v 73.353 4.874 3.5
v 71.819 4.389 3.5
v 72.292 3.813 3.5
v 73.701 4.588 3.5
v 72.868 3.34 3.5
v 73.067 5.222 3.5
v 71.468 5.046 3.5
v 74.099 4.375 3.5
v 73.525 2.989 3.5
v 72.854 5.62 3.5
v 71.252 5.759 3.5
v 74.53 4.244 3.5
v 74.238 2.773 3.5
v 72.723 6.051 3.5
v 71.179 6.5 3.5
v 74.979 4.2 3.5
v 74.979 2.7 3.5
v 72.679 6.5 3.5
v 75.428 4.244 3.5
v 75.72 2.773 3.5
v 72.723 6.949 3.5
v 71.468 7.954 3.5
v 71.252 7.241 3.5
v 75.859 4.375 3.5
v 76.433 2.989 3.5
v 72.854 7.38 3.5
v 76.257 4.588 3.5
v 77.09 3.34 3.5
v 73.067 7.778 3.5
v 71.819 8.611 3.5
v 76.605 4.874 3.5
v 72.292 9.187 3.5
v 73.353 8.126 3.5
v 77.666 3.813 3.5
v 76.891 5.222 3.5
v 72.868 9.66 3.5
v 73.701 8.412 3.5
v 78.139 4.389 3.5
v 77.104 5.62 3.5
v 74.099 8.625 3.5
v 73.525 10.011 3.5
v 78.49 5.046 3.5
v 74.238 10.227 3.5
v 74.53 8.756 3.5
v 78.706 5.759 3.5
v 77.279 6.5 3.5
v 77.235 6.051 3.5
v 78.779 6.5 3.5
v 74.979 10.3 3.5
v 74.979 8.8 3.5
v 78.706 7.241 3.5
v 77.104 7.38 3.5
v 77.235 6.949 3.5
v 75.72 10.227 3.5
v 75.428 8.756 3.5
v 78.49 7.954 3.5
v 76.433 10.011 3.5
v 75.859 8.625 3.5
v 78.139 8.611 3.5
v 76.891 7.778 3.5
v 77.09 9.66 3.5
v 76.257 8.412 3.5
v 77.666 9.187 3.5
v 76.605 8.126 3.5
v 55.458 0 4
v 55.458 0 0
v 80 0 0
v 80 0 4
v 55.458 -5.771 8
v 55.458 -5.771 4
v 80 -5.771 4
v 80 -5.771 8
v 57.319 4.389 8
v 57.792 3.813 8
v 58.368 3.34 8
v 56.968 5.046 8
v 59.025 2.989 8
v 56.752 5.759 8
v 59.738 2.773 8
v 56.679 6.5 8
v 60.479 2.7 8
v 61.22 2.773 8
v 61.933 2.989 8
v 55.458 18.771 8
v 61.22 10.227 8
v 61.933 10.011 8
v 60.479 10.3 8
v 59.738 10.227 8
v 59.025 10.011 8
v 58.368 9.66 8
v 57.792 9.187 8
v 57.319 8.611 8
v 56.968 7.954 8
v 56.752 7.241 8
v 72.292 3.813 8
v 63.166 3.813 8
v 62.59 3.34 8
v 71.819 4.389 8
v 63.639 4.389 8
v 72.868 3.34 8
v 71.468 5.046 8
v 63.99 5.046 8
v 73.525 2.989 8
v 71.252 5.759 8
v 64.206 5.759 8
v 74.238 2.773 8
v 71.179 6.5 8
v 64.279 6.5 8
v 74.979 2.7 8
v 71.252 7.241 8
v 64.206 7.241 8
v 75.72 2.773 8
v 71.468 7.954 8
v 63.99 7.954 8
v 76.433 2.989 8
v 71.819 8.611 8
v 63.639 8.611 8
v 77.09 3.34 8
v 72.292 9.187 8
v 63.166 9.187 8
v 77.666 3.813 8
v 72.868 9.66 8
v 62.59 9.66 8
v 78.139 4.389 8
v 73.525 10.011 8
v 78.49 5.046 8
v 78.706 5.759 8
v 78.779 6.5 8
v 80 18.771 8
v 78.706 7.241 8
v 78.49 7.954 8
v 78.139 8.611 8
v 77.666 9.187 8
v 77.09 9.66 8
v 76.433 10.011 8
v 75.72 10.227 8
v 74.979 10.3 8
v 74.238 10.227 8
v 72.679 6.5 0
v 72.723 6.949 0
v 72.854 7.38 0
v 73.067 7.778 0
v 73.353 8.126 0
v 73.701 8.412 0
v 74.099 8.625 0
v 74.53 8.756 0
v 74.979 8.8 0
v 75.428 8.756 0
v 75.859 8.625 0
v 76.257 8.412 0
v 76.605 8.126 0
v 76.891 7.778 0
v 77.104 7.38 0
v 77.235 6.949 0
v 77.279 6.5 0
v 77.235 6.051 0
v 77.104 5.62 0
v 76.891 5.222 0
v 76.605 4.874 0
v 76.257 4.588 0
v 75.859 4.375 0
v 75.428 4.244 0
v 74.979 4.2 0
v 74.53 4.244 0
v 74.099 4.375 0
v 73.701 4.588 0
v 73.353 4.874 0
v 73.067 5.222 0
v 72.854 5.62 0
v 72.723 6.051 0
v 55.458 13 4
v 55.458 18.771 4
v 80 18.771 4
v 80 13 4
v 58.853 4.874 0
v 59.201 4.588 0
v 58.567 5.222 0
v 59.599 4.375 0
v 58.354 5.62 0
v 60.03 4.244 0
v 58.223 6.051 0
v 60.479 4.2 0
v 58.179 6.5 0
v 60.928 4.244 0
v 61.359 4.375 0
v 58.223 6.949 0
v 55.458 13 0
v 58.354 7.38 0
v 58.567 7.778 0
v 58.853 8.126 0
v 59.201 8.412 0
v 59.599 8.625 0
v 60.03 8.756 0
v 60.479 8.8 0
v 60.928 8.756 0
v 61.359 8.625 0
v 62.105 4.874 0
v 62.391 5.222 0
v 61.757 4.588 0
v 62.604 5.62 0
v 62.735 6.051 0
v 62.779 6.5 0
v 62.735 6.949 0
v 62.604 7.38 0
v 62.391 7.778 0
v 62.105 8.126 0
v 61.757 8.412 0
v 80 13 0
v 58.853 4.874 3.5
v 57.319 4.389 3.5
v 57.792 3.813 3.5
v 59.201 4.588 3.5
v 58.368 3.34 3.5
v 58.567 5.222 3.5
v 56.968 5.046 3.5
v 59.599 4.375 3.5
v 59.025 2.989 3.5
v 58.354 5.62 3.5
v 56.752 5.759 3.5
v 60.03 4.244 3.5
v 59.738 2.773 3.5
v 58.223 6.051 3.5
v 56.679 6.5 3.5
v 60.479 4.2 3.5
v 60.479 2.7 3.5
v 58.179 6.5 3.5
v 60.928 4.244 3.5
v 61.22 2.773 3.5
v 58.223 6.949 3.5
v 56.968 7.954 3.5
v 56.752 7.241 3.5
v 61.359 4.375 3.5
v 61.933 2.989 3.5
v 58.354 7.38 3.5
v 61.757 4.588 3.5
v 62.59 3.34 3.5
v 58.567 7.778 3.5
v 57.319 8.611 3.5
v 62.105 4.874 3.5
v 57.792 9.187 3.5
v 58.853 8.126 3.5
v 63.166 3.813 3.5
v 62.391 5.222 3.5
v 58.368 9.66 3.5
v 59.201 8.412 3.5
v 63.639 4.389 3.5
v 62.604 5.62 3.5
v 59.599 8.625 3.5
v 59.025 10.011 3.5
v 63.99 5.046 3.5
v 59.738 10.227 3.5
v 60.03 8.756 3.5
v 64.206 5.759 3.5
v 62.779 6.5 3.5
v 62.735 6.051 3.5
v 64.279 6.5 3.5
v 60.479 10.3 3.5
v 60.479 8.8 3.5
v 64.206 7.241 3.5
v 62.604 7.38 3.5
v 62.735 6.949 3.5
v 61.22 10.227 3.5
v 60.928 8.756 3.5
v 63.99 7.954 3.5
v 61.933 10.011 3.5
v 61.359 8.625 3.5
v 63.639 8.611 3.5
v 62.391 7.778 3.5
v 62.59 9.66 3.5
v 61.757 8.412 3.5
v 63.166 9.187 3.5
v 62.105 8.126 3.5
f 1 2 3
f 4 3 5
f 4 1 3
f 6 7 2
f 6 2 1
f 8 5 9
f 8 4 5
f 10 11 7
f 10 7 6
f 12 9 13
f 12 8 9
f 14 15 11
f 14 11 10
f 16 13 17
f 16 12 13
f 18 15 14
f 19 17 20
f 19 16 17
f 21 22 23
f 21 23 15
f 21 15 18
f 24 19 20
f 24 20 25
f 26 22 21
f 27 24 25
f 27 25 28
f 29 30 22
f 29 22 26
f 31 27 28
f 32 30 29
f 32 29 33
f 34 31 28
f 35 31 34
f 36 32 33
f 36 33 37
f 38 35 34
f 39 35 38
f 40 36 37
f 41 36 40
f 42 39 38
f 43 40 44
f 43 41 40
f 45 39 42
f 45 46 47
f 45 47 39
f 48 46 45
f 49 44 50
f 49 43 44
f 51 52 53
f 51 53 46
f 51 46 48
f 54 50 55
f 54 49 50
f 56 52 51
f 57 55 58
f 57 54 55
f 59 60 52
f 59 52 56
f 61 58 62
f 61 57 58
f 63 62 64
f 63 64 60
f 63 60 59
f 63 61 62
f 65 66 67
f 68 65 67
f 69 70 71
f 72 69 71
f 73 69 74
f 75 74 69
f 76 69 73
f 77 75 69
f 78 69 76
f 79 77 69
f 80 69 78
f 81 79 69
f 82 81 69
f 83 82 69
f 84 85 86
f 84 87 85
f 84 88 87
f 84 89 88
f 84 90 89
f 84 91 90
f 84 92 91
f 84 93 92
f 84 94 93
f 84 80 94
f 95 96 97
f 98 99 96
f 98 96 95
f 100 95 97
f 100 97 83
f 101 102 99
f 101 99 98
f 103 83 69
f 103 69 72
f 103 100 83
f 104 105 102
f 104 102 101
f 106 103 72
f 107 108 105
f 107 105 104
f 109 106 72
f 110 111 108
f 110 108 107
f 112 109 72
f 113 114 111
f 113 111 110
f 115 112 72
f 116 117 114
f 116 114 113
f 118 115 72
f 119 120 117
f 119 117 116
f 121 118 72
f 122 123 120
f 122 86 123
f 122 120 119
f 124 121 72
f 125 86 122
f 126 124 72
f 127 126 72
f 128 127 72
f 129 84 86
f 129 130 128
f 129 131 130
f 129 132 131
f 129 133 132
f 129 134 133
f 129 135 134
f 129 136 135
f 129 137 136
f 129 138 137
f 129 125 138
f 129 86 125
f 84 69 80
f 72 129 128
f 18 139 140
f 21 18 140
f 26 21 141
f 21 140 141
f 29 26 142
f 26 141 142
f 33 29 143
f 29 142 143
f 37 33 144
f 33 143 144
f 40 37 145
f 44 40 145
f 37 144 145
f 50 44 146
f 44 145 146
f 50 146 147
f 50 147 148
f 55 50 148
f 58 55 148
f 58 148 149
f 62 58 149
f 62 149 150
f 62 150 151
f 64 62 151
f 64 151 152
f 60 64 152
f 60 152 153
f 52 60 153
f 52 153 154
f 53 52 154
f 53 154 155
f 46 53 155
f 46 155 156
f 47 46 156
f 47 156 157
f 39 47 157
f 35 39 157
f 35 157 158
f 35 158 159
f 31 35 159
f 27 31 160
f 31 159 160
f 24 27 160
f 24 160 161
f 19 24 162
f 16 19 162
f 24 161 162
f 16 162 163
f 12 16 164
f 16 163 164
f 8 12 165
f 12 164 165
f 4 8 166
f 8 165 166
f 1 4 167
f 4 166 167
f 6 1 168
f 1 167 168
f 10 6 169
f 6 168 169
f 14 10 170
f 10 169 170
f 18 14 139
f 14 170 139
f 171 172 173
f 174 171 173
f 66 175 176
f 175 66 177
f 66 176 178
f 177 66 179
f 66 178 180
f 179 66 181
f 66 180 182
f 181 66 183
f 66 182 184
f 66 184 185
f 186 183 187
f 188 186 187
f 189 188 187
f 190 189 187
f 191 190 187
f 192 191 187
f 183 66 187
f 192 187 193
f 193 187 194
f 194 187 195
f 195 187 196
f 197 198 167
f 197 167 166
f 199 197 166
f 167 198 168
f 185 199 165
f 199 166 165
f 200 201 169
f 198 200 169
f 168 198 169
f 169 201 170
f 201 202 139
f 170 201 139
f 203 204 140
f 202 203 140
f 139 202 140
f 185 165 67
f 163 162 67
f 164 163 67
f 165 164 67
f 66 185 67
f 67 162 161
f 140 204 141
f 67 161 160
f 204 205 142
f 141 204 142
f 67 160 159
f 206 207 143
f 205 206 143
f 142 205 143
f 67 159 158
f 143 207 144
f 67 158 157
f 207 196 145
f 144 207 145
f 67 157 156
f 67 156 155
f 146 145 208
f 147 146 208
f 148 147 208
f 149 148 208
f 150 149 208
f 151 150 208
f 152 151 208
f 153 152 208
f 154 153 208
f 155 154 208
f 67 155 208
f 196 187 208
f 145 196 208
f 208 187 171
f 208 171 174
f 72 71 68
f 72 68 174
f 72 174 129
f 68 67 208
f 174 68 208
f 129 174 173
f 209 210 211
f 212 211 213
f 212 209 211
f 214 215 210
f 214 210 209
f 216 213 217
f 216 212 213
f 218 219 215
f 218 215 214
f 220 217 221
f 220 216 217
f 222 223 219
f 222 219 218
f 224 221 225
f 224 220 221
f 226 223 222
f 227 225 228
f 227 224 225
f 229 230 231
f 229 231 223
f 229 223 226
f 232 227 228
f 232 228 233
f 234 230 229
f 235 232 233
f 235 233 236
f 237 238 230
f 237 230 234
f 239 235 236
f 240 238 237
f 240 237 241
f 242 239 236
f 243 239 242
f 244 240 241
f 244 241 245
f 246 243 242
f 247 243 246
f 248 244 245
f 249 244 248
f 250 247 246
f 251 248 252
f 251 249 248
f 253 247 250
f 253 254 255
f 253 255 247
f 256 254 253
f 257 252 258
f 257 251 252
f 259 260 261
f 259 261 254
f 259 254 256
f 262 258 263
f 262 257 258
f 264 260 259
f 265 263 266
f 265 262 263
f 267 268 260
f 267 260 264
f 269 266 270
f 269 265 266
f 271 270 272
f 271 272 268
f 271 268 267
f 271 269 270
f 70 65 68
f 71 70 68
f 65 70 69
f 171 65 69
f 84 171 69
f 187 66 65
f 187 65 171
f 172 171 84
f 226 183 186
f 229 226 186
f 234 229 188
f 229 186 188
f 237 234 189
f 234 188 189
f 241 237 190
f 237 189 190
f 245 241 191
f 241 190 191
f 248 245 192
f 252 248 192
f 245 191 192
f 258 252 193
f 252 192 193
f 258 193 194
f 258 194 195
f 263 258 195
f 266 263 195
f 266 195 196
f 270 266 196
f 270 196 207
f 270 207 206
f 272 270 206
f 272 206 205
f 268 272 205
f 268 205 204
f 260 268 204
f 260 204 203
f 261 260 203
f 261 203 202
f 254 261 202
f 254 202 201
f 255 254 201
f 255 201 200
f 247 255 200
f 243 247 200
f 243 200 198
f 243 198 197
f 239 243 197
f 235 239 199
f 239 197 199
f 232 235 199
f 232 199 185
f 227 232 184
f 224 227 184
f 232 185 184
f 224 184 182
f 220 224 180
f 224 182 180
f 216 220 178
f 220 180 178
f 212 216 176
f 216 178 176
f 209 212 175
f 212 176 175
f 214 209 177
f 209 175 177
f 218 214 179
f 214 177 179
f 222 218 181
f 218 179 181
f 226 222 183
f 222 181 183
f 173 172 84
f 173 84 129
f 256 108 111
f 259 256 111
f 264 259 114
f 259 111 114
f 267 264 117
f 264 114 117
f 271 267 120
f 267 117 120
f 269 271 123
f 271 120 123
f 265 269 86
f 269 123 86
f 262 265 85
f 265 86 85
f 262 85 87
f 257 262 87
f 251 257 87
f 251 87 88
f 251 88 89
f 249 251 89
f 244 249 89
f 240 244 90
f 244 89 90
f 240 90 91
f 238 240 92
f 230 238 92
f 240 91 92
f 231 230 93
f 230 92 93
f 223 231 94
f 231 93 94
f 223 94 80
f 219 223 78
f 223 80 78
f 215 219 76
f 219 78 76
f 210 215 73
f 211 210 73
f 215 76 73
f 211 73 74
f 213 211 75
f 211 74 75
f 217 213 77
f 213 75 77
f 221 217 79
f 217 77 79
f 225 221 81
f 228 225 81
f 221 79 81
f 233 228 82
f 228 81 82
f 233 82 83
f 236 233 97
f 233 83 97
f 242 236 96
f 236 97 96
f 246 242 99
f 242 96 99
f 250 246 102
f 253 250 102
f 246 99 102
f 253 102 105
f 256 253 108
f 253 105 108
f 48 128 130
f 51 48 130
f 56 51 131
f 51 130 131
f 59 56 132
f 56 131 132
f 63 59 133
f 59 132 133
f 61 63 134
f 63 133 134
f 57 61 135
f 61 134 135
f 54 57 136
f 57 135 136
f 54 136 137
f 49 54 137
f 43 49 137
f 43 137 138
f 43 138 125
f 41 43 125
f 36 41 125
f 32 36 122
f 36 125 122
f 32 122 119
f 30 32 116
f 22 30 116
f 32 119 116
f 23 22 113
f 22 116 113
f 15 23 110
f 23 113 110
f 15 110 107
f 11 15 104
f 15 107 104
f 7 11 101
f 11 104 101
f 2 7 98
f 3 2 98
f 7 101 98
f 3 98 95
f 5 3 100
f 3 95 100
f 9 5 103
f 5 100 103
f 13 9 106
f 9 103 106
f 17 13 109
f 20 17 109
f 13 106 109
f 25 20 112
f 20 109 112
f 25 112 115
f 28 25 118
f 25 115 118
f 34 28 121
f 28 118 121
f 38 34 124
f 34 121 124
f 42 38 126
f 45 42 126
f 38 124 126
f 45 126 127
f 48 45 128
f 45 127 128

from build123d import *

# Parameters (mm, degrees)
SKETCH1_W           = 24.542
SKETCH1_H           = 13
BOSS_EXTRUDE1_DEPTH = 4
SKETCH2_W           = 24.542
SKETCH2_H           = 24.542
BOSS_EXTRUDE2_DEPTH = 4
SKETCH3_R           = 2.3
CUT_EXTRUDE1_DEPTH  = 9
SKETCH4_R           = 3.8
CUT_EXTRUDE2_DEPTH  = 4.5


with BuildPart() as part:
    # Sketch1 → Boss-Extrude1 (new body)
    with BuildSketch(Plane.XY):
        with Locations((67.729, 6.5)):
            Rectangle(SKETCH1_W, SKETCH1_H)
    extrude(amount=BOSS_EXTRUDE1_DEPTH)

    # Sketch2 → Boss-Extrude2 (add)
    with BuildSketch(Plane.XY.offset(4)):
        with Locations((67.729, 6.5)):
            Rectangle(SKETCH2_W, SKETCH2_H)
    extrude(amount=BOSS_EXTRUDE2_DEPTH)

    # Sketch3 → Cut-Extrude1 (cut, through all)
    with BuildSketch(Plane(origin=(0, 0, 0), x_dir=(-1, 0, 0), z_dir=(0, 0, -1))):
        with Locations((-60.479, 6.5)):
            Circle(SKETCH3_R)
        with Locations((-74.979, 6.5)):
            Circle(SKETCH3_R)
    extrude(amount=-CUT_EXTRUDE1_DEPTH, mode=Mode.SUBTRACT)

    # Sketch4 → Cut-Extrude2 (cut)
    with BuildSketch(Plane.XY.offset(8)):
        with Locations((60.479, 6.5)):
            Circle(SKETCH4_R)
        with Locations((74.979, 6.5)):
            Circle(SKETCH4_R)
    extrude(amount=-CUT_EXTRUDE2_DEPTH, mode=Mode.SUBTRACT)


solid = part.part
